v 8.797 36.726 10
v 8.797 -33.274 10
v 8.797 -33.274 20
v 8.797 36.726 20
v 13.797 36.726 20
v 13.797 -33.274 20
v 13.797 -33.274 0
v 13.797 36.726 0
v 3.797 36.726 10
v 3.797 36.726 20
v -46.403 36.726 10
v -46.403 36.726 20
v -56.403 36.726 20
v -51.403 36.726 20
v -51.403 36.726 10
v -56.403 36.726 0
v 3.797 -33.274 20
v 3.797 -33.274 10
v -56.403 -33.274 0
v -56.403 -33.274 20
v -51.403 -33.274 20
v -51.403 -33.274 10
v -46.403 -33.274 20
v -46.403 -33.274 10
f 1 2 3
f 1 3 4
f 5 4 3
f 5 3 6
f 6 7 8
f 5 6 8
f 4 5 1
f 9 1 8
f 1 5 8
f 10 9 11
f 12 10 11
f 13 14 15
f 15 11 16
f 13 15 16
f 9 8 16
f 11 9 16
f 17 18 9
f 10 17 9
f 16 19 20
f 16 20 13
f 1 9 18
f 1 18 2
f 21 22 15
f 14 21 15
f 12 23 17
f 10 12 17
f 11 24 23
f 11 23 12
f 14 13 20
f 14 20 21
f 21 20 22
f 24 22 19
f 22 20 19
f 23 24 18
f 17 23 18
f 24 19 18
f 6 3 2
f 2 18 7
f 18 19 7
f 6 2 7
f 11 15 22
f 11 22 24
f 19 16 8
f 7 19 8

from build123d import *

# Parameters (mm, degrees)
F0_W     = 5
F0_H     = 70
F1_DEPTH = 20
F0_W_2   = 50.2
F0_W_3   = 2.5
F2_DEPTH = 10


with BuildPart() as f1:
    # F0 (on Top) → F1 (new body)
    with BuildSketch(Plane.XY):
        with Locations((-53.9031001925, 1.7255722731)):
            Rectangle(F0_W, F0_H)
    extrude(amount=F1_DEPTH)



with BuildPart() as f1b:
    # F0 (on Top) → F1, piece 2 (new body)
    with BuildSketch(Plane.XY):
        with Locations((-21.3031001925, 1.7255722731)):
            Rectangle(F0_W_2, F0_H)
    extrude(amount=F1_DEPTH)


with BuildPart() as f1c:
    # F0 (on Top) → F1, piece 3 (new body)
    with BuildSketch(Plane.XY):
        with Locations((11.2968998075, 1.7255722731)):
            Rectangle(F0_W, F0_H)
    extrude(amount=F1_DEPTH)


with BuildPart() as f1_1:
    add(f1.part)

    add(f1b.part)  # F2 merges F1b

    add(f1c.part)  # F2 merges F1c
    # F0 (on Top) → F2 (join)
    with BuildSketch(Plane.XY):
        with Locations((-47.6531001925, 1.7255722731)):
            Rectangle(F0_W_3, F0_H)
        with Locations((-50.1531001925, 1.7255722731)):
            Rectangle(F0_W_3, F0_H)
        with Locations((5.0468998075, 1.7255722731)):
            Rectangle(F0_W_3, F0_H)
        with Locations((7.5468998075, 1.7255722731)):
            Rectangle(F0_W_3, F0_H)
    extrude(amount=F2_DEPTH)


solid = f1_1.part
